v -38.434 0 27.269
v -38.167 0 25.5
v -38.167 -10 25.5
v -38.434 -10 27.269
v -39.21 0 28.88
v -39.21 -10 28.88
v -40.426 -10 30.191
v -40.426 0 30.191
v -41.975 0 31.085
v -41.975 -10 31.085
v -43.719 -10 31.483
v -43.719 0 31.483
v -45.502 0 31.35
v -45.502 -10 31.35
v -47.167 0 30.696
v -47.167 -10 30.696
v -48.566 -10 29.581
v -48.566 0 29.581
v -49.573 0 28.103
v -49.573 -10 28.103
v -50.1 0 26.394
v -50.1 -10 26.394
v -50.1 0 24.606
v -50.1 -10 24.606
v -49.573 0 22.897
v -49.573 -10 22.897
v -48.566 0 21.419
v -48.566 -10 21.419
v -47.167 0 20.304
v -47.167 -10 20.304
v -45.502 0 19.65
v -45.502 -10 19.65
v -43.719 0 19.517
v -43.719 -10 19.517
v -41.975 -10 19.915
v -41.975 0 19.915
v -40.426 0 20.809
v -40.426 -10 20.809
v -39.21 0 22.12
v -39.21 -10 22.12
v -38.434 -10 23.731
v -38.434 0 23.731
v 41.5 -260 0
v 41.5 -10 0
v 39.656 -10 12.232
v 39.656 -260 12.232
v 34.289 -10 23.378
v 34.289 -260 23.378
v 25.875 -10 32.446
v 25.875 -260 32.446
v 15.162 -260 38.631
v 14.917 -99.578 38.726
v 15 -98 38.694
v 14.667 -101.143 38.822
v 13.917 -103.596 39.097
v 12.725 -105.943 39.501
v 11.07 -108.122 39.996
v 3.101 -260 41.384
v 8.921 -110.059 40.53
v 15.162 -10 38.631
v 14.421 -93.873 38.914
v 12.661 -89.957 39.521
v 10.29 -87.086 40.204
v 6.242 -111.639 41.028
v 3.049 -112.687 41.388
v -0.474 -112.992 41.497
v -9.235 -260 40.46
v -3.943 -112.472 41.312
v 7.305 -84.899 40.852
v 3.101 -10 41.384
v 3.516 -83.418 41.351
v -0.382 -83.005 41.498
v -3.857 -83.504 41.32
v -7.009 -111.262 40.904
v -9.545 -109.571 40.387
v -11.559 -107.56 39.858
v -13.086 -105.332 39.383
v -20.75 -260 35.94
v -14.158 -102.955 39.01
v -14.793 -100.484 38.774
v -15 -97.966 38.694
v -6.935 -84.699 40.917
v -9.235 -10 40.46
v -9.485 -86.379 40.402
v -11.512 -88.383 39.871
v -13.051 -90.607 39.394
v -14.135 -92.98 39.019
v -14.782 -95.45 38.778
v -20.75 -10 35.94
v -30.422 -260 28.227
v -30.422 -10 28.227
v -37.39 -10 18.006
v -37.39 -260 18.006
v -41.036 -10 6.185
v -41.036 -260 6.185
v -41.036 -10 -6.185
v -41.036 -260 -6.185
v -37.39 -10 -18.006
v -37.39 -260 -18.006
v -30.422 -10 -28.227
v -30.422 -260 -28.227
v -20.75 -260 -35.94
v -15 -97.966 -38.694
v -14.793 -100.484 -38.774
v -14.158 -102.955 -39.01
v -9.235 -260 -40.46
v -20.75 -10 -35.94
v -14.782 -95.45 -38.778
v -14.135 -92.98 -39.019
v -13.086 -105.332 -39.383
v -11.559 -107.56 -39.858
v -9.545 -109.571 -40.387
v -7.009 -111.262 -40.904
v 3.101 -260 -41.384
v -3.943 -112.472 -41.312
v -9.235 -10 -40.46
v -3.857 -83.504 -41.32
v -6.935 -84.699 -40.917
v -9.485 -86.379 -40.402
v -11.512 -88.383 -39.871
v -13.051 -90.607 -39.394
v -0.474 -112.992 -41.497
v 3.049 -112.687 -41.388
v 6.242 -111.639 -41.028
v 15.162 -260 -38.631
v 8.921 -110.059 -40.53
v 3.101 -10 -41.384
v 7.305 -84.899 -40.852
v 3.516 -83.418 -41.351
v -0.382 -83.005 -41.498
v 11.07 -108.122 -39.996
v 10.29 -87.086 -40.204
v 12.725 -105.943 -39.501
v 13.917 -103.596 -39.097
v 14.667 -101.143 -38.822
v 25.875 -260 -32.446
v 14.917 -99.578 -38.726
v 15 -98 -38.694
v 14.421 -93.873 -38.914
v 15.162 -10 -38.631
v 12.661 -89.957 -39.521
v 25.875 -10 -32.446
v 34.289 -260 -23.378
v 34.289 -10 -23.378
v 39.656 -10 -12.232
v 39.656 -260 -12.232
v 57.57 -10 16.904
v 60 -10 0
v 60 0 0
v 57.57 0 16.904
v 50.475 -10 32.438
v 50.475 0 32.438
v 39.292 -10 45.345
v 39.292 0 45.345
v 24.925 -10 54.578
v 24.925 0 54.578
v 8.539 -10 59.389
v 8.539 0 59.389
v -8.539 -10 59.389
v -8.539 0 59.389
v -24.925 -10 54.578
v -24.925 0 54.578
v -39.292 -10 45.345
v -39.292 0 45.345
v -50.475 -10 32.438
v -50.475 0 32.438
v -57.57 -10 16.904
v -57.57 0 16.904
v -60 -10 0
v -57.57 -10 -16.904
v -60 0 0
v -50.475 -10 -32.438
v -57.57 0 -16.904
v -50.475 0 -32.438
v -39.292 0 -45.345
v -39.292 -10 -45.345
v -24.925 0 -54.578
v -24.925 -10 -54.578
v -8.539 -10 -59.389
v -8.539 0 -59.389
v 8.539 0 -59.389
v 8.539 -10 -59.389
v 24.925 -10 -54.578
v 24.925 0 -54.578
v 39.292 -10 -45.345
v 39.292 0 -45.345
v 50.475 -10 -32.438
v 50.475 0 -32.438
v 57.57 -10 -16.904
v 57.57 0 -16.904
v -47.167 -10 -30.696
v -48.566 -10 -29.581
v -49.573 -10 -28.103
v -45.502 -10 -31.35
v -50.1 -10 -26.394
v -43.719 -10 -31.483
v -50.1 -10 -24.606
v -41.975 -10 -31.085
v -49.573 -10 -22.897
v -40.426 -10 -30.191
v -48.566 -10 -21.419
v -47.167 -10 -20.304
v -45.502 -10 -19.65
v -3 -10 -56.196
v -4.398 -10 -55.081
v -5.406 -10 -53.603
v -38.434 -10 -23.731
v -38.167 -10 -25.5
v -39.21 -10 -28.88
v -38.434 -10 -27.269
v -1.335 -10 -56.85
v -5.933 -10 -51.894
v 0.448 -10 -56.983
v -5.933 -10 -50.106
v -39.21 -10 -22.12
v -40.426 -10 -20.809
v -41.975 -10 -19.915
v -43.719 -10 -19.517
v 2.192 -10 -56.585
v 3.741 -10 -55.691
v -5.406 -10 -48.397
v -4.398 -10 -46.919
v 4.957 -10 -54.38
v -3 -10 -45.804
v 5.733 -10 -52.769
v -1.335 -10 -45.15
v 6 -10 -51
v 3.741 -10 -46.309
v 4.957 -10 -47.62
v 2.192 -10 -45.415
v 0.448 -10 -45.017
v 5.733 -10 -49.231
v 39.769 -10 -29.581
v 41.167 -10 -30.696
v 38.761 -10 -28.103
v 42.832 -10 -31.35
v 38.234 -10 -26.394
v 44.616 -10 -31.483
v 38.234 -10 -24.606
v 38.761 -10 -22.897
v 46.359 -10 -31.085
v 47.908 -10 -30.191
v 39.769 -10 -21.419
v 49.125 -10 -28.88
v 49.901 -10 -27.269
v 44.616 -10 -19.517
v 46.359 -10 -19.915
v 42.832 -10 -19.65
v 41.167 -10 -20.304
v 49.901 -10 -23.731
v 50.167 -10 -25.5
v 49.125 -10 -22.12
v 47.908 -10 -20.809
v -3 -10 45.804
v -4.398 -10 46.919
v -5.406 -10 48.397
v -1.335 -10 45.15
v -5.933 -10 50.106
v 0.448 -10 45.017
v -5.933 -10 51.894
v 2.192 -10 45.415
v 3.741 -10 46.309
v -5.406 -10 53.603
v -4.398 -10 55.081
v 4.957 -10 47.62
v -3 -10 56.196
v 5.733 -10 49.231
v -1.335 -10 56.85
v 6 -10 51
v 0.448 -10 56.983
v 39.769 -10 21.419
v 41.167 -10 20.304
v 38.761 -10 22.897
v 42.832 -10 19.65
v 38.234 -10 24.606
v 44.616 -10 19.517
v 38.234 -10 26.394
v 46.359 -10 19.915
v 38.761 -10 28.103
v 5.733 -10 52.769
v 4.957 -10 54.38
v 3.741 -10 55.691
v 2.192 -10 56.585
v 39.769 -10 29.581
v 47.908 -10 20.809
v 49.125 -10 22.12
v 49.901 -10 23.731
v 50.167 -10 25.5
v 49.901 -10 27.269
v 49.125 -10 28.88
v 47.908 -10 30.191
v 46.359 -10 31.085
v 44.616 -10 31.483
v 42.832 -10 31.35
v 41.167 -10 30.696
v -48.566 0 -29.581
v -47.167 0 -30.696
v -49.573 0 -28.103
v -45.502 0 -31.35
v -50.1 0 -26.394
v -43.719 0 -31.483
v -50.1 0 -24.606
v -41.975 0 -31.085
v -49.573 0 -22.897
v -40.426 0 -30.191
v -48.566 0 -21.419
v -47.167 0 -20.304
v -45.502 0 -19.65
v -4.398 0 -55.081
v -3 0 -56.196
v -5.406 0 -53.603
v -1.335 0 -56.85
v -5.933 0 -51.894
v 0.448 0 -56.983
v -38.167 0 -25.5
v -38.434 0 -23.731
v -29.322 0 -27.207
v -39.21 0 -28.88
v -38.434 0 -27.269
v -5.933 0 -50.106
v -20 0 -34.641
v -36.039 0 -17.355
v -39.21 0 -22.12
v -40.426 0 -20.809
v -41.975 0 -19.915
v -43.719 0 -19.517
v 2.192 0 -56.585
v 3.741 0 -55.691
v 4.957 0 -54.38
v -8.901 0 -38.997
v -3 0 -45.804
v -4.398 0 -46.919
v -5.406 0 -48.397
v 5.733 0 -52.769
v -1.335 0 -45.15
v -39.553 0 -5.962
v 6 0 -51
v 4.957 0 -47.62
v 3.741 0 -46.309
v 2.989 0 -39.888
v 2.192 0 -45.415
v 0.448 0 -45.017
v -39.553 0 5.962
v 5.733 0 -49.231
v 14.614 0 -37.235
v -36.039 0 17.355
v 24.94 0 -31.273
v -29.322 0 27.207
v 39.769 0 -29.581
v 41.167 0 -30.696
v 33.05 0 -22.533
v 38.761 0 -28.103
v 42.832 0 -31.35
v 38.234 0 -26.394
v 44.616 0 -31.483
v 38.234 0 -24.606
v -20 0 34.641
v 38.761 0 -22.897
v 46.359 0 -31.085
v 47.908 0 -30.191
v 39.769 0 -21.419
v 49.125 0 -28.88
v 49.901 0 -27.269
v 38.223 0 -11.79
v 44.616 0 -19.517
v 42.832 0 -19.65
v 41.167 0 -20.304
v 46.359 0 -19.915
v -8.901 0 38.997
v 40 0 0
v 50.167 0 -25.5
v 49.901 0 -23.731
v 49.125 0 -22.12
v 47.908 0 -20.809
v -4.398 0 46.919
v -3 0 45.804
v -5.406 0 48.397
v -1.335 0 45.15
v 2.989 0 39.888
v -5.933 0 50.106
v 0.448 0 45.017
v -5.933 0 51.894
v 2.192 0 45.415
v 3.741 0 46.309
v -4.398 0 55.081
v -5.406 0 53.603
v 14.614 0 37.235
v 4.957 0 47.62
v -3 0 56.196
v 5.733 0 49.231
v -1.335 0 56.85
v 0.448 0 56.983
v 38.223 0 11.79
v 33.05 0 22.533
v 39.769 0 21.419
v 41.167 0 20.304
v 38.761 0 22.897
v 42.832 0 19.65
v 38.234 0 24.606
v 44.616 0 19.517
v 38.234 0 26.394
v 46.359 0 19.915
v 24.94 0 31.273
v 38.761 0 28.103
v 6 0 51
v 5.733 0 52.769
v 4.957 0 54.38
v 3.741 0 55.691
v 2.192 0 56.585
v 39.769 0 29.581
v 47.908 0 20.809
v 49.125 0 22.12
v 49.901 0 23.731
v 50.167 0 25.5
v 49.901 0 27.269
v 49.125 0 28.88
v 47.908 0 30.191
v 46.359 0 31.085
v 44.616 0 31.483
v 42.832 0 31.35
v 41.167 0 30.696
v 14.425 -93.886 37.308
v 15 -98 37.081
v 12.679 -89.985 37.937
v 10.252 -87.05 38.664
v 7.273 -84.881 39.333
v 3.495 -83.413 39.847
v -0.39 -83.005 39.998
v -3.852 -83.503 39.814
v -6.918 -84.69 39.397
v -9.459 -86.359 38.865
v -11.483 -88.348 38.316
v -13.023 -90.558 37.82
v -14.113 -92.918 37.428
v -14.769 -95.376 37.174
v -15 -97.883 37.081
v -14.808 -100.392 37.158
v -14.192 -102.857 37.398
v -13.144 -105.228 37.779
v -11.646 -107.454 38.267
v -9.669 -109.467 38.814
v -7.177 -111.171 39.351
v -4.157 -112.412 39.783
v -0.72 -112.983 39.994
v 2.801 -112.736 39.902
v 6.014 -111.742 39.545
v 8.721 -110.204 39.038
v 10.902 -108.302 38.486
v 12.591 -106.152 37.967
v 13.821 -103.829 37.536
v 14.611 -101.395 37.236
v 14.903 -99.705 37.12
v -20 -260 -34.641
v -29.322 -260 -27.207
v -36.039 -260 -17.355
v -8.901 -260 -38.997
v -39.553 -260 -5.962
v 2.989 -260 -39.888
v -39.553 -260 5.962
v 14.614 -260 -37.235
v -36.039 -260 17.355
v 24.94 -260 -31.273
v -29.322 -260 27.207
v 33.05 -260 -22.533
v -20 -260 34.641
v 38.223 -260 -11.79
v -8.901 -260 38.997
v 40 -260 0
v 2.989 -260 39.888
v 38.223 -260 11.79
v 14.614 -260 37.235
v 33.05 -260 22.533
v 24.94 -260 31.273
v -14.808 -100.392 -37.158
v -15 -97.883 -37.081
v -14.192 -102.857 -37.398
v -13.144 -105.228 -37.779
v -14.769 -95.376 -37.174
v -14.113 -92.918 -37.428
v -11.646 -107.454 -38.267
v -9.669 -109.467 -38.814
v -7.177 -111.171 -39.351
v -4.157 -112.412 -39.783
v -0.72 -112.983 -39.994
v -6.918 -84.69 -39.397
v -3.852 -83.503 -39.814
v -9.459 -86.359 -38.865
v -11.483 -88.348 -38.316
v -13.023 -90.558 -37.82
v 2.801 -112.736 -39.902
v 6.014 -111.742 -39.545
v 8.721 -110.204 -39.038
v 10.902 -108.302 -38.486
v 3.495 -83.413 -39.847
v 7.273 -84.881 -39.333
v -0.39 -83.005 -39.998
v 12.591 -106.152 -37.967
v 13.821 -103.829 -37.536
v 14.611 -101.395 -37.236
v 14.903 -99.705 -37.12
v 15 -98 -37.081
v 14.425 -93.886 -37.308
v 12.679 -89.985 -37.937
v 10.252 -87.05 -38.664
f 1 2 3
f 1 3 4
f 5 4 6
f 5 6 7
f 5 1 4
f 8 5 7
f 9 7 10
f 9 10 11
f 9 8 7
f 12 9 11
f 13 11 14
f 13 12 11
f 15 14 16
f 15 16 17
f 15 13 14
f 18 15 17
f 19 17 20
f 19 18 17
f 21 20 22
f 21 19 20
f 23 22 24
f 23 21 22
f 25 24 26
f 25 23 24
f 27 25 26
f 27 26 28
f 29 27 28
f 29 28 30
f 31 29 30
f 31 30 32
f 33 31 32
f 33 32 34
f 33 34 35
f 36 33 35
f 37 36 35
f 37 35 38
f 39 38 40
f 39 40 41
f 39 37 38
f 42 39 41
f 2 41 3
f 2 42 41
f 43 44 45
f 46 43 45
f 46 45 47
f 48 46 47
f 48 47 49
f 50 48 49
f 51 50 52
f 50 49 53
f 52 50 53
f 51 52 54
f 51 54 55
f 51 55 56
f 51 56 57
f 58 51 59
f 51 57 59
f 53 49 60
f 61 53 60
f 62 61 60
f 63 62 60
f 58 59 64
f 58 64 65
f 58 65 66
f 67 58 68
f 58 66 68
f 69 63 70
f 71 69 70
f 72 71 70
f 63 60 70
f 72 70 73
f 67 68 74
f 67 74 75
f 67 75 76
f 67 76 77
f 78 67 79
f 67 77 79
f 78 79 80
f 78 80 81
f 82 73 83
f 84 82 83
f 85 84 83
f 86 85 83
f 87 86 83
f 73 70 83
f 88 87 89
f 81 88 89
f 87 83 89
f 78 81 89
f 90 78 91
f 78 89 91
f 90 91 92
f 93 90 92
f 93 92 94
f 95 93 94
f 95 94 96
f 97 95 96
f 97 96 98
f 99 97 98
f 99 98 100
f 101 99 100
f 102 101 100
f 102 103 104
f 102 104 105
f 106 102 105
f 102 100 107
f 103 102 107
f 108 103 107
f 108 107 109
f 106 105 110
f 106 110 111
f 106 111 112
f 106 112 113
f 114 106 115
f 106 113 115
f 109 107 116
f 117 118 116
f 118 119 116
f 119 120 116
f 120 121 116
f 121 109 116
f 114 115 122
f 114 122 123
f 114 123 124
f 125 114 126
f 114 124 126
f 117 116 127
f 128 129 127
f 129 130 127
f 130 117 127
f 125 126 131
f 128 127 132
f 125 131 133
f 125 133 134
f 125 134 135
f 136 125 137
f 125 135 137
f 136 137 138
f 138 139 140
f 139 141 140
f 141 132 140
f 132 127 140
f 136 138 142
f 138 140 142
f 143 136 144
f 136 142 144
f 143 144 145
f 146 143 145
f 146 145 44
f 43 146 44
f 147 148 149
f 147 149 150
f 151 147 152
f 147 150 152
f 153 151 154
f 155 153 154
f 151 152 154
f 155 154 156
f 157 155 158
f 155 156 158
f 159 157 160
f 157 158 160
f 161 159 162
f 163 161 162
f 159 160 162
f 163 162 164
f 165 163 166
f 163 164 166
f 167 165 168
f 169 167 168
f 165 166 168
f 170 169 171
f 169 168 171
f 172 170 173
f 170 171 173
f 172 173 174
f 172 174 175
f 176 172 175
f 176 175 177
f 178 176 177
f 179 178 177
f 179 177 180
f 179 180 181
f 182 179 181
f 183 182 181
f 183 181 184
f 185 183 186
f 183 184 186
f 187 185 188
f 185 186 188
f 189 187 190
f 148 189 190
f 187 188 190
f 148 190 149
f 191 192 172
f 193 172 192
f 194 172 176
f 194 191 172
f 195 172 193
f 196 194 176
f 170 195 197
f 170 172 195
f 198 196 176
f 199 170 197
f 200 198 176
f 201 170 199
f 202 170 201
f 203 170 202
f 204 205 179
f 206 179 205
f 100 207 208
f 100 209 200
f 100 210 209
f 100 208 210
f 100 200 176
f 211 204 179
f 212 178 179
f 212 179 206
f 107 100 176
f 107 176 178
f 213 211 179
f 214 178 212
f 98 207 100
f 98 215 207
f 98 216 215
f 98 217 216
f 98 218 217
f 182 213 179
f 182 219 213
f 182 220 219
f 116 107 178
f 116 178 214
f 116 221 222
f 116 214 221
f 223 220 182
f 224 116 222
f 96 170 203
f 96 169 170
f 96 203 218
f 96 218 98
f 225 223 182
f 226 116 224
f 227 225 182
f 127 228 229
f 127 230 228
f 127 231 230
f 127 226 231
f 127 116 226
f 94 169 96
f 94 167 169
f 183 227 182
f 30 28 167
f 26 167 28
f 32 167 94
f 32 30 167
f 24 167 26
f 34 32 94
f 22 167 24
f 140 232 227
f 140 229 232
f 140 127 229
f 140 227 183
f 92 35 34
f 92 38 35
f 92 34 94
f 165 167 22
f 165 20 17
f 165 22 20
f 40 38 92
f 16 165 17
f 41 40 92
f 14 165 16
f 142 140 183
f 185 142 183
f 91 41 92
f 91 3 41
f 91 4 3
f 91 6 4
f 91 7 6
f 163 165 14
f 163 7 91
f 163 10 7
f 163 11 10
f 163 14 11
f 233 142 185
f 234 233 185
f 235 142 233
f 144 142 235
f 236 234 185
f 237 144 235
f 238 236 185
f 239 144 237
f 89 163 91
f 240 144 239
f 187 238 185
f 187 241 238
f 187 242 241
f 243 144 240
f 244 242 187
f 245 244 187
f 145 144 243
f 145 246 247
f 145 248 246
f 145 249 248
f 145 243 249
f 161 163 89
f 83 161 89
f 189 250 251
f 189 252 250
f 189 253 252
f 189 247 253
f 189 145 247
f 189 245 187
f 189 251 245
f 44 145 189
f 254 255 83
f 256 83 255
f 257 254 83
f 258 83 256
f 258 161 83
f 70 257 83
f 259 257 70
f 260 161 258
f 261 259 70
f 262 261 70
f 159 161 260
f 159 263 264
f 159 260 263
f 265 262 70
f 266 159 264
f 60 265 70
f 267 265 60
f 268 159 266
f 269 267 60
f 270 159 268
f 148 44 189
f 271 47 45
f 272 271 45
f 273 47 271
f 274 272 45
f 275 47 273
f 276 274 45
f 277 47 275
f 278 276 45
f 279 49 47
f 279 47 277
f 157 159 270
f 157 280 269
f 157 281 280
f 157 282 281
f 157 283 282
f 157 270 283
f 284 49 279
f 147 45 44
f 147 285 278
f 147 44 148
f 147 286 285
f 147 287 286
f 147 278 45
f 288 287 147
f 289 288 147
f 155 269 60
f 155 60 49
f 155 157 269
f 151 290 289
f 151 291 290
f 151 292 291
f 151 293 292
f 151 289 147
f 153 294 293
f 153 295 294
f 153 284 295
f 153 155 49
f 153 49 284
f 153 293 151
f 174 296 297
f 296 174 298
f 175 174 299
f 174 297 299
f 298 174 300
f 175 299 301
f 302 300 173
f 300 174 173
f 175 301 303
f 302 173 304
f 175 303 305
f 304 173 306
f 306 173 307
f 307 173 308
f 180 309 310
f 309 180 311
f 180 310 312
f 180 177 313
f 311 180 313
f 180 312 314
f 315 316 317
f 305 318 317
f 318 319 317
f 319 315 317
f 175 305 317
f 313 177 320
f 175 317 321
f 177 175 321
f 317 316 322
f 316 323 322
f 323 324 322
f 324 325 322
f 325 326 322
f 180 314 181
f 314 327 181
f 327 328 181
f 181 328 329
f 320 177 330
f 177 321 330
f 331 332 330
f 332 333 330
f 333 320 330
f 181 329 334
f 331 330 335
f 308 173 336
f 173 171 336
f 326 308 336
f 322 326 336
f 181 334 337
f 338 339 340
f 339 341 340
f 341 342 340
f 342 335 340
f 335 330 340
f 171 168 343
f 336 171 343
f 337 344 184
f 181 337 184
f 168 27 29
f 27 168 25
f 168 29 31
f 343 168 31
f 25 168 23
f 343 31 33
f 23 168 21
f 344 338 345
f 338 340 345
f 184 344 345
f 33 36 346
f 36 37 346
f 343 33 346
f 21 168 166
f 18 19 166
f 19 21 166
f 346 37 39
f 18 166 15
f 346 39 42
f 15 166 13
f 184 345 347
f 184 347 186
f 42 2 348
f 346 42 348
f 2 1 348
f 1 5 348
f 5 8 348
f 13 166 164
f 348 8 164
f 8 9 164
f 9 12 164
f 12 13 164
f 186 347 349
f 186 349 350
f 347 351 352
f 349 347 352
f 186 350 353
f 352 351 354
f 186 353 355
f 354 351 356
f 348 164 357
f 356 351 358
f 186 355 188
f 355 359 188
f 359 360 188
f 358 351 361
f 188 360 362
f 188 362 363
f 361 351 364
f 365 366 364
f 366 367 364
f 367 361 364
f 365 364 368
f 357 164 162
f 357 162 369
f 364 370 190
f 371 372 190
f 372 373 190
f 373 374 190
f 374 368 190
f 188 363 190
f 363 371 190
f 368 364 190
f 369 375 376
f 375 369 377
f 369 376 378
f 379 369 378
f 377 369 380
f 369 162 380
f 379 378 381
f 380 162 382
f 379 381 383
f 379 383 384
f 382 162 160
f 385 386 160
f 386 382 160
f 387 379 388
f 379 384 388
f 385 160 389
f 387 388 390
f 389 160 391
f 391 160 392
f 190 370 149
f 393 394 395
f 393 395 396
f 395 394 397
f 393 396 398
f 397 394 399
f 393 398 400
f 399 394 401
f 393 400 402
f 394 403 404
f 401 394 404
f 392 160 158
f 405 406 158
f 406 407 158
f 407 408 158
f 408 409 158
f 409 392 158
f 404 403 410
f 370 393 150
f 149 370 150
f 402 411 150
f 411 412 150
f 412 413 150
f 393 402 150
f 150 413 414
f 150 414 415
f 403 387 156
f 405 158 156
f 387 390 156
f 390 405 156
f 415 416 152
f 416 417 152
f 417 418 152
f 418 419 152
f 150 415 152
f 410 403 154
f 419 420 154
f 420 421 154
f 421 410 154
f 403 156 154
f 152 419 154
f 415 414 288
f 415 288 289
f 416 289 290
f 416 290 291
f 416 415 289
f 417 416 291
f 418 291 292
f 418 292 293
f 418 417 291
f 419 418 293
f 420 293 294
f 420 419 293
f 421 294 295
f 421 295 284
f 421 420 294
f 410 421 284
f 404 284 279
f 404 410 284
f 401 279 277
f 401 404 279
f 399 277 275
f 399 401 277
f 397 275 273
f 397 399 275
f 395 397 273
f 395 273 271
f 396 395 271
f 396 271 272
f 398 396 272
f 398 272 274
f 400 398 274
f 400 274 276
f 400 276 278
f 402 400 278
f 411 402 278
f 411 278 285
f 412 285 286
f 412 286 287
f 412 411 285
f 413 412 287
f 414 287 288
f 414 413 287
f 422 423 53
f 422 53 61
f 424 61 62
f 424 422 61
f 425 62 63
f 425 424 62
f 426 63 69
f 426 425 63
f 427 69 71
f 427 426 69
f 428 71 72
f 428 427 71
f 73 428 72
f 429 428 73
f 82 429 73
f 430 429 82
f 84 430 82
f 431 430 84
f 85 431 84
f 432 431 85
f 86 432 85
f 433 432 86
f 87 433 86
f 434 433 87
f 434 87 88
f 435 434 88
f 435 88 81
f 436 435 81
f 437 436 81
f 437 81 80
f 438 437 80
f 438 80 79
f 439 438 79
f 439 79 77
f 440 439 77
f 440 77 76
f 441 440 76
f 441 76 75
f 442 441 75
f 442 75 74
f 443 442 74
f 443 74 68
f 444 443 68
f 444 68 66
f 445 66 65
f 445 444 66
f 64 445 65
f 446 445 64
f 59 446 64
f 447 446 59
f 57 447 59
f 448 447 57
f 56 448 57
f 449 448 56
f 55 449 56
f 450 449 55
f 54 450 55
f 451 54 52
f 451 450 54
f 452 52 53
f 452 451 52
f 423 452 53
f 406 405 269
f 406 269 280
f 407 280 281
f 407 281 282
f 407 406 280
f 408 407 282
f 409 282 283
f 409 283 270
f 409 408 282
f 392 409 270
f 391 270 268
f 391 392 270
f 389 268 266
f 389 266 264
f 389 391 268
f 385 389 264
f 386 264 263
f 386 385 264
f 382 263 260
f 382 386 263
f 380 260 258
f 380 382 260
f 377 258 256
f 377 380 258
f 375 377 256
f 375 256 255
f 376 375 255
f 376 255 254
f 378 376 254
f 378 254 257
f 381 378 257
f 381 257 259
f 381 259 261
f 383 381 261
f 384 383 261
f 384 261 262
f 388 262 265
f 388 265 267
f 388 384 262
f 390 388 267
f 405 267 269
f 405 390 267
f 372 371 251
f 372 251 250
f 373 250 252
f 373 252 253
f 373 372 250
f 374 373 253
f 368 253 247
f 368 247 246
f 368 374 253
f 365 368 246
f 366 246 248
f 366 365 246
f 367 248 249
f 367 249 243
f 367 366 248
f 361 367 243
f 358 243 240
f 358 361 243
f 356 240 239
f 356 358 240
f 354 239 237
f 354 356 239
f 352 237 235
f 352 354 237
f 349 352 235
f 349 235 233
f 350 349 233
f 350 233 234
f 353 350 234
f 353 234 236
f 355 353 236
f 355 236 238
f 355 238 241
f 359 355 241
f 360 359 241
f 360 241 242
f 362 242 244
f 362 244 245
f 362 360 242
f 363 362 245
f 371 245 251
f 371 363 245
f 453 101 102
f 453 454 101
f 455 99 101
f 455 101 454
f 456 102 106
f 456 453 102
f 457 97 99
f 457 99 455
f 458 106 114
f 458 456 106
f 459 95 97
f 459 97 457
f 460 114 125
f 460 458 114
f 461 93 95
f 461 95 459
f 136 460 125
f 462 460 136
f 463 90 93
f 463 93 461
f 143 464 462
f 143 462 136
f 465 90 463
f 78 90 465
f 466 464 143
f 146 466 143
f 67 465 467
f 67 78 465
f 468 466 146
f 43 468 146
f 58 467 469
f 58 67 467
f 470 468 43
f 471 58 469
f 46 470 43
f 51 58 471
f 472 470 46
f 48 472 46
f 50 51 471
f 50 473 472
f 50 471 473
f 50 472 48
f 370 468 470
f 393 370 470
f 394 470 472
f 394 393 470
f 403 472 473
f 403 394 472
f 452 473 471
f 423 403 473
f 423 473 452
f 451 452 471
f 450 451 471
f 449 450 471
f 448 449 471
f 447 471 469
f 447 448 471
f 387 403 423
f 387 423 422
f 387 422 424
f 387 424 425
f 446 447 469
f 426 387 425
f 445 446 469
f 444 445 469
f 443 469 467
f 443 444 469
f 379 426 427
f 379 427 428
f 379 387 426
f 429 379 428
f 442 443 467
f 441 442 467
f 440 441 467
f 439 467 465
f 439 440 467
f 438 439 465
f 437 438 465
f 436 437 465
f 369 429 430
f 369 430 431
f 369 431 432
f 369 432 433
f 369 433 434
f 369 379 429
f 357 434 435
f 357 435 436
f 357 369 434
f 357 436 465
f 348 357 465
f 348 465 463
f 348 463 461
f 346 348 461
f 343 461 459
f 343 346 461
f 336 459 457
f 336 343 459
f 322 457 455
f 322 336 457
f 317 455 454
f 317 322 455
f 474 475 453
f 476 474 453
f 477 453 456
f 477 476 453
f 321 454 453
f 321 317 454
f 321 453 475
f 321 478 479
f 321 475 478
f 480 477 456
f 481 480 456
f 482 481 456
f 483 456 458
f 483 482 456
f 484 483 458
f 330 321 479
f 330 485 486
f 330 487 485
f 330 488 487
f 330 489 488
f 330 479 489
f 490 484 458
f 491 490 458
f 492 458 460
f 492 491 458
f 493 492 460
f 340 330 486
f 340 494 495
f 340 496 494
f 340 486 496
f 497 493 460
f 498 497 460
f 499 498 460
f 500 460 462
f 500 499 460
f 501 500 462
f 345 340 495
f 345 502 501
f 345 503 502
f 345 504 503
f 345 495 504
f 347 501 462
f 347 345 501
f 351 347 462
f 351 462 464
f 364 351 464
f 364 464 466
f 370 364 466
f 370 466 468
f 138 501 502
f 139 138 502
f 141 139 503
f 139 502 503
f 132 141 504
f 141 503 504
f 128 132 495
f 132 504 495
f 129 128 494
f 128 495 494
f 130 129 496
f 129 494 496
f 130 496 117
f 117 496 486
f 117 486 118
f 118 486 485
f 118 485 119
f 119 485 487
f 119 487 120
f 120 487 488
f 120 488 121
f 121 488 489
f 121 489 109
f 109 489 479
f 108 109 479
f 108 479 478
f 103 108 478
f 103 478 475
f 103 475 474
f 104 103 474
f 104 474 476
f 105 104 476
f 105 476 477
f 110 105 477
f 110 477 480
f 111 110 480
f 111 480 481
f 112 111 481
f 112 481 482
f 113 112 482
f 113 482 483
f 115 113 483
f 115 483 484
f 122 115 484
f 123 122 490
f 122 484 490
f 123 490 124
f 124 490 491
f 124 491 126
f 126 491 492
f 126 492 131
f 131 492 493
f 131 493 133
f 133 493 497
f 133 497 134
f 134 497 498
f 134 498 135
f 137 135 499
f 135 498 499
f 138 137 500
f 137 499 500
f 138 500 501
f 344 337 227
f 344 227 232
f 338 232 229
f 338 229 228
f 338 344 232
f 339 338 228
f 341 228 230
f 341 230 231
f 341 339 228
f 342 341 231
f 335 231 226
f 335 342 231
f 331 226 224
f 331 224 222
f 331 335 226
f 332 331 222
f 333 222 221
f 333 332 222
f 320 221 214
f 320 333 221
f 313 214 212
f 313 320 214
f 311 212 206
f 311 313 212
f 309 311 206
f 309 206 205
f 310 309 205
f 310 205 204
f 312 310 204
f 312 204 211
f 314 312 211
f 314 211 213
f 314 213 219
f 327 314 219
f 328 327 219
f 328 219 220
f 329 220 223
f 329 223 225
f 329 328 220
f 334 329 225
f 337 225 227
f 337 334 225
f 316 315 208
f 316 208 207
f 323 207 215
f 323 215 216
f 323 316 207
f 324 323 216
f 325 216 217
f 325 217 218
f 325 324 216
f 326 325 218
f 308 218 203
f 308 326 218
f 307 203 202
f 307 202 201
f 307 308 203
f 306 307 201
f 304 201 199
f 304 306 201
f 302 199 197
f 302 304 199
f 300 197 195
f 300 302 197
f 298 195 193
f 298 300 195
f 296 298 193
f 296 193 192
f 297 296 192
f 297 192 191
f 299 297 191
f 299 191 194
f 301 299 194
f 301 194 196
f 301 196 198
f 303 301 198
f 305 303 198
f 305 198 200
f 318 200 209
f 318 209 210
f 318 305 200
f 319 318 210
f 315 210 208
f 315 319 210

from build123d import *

# Parameters (mm, degrees)
F0_R          = 60
F0_R_2        = 6
F0_R_3        = 40
F1_DEPTH      = 10
F2_R          = 41.5
F2_R_2        = 40
F3_DEPTH      = 250
F4_R          = 15
F5_DEPTH      = 70.8
F5_DEPTH_BACK = 74.6


with BuildPart() as f1:
    # F0 (on Front) → F1 (new body)
    with BuildSketch(Plane.XZ):
        Circle(F0_R)
        with Locations((-44.167295593, -25.5)):
            Circle(F0_R_2, mode=Mode.SUBTRACT)
        with Locations((0, -51)):
            Circle(F0_R_2, mode=Mode.SUBTRACT)
        with Locations((44.167295593, -25.5)):
            Circle(F0_R_2, mode=Mode.SUBTRACT)
        with Locations((-44.167295593, 25.5)):
            Circle(F0_R_2, mode=Mode.SUBTRACT)
        Circle(F0_R_3, mode=Mode.SUBTRACT)
        with Locations((44.167295593, 25.5)):
            Circle(F0_R_2, mode=Mode.SUBTRACT)
        with Locations((0, 51)):
            Circle(F0_R_2, mode=Mode.SUBTRACT)
    extrude(amount=F1_DEPTH)

    # F2 (on face) → F3 (join)
    with BuildSketch(Plane.XZ.offset(10)):
        Circle(F2_R)
        Circle(F2_R_2, mode=Mode.SUBTRACT)
    extrude(amount=F3_DEPTH)

    # F4 (on Top) → F5 (cut, two sides)
    with BuildSketch(Plane.XY) as f5_sk:
        with Locations((0, -98)):
            Circle(F4_R)
    extrude(amount=-F5_DEPTH, mode=Mode.SUBTRACT)
    extrude(f5_sk.sketch, amount=F5_DEPTH_BACK, mode=Mode.SUBTRACT)


solid = f1.part
